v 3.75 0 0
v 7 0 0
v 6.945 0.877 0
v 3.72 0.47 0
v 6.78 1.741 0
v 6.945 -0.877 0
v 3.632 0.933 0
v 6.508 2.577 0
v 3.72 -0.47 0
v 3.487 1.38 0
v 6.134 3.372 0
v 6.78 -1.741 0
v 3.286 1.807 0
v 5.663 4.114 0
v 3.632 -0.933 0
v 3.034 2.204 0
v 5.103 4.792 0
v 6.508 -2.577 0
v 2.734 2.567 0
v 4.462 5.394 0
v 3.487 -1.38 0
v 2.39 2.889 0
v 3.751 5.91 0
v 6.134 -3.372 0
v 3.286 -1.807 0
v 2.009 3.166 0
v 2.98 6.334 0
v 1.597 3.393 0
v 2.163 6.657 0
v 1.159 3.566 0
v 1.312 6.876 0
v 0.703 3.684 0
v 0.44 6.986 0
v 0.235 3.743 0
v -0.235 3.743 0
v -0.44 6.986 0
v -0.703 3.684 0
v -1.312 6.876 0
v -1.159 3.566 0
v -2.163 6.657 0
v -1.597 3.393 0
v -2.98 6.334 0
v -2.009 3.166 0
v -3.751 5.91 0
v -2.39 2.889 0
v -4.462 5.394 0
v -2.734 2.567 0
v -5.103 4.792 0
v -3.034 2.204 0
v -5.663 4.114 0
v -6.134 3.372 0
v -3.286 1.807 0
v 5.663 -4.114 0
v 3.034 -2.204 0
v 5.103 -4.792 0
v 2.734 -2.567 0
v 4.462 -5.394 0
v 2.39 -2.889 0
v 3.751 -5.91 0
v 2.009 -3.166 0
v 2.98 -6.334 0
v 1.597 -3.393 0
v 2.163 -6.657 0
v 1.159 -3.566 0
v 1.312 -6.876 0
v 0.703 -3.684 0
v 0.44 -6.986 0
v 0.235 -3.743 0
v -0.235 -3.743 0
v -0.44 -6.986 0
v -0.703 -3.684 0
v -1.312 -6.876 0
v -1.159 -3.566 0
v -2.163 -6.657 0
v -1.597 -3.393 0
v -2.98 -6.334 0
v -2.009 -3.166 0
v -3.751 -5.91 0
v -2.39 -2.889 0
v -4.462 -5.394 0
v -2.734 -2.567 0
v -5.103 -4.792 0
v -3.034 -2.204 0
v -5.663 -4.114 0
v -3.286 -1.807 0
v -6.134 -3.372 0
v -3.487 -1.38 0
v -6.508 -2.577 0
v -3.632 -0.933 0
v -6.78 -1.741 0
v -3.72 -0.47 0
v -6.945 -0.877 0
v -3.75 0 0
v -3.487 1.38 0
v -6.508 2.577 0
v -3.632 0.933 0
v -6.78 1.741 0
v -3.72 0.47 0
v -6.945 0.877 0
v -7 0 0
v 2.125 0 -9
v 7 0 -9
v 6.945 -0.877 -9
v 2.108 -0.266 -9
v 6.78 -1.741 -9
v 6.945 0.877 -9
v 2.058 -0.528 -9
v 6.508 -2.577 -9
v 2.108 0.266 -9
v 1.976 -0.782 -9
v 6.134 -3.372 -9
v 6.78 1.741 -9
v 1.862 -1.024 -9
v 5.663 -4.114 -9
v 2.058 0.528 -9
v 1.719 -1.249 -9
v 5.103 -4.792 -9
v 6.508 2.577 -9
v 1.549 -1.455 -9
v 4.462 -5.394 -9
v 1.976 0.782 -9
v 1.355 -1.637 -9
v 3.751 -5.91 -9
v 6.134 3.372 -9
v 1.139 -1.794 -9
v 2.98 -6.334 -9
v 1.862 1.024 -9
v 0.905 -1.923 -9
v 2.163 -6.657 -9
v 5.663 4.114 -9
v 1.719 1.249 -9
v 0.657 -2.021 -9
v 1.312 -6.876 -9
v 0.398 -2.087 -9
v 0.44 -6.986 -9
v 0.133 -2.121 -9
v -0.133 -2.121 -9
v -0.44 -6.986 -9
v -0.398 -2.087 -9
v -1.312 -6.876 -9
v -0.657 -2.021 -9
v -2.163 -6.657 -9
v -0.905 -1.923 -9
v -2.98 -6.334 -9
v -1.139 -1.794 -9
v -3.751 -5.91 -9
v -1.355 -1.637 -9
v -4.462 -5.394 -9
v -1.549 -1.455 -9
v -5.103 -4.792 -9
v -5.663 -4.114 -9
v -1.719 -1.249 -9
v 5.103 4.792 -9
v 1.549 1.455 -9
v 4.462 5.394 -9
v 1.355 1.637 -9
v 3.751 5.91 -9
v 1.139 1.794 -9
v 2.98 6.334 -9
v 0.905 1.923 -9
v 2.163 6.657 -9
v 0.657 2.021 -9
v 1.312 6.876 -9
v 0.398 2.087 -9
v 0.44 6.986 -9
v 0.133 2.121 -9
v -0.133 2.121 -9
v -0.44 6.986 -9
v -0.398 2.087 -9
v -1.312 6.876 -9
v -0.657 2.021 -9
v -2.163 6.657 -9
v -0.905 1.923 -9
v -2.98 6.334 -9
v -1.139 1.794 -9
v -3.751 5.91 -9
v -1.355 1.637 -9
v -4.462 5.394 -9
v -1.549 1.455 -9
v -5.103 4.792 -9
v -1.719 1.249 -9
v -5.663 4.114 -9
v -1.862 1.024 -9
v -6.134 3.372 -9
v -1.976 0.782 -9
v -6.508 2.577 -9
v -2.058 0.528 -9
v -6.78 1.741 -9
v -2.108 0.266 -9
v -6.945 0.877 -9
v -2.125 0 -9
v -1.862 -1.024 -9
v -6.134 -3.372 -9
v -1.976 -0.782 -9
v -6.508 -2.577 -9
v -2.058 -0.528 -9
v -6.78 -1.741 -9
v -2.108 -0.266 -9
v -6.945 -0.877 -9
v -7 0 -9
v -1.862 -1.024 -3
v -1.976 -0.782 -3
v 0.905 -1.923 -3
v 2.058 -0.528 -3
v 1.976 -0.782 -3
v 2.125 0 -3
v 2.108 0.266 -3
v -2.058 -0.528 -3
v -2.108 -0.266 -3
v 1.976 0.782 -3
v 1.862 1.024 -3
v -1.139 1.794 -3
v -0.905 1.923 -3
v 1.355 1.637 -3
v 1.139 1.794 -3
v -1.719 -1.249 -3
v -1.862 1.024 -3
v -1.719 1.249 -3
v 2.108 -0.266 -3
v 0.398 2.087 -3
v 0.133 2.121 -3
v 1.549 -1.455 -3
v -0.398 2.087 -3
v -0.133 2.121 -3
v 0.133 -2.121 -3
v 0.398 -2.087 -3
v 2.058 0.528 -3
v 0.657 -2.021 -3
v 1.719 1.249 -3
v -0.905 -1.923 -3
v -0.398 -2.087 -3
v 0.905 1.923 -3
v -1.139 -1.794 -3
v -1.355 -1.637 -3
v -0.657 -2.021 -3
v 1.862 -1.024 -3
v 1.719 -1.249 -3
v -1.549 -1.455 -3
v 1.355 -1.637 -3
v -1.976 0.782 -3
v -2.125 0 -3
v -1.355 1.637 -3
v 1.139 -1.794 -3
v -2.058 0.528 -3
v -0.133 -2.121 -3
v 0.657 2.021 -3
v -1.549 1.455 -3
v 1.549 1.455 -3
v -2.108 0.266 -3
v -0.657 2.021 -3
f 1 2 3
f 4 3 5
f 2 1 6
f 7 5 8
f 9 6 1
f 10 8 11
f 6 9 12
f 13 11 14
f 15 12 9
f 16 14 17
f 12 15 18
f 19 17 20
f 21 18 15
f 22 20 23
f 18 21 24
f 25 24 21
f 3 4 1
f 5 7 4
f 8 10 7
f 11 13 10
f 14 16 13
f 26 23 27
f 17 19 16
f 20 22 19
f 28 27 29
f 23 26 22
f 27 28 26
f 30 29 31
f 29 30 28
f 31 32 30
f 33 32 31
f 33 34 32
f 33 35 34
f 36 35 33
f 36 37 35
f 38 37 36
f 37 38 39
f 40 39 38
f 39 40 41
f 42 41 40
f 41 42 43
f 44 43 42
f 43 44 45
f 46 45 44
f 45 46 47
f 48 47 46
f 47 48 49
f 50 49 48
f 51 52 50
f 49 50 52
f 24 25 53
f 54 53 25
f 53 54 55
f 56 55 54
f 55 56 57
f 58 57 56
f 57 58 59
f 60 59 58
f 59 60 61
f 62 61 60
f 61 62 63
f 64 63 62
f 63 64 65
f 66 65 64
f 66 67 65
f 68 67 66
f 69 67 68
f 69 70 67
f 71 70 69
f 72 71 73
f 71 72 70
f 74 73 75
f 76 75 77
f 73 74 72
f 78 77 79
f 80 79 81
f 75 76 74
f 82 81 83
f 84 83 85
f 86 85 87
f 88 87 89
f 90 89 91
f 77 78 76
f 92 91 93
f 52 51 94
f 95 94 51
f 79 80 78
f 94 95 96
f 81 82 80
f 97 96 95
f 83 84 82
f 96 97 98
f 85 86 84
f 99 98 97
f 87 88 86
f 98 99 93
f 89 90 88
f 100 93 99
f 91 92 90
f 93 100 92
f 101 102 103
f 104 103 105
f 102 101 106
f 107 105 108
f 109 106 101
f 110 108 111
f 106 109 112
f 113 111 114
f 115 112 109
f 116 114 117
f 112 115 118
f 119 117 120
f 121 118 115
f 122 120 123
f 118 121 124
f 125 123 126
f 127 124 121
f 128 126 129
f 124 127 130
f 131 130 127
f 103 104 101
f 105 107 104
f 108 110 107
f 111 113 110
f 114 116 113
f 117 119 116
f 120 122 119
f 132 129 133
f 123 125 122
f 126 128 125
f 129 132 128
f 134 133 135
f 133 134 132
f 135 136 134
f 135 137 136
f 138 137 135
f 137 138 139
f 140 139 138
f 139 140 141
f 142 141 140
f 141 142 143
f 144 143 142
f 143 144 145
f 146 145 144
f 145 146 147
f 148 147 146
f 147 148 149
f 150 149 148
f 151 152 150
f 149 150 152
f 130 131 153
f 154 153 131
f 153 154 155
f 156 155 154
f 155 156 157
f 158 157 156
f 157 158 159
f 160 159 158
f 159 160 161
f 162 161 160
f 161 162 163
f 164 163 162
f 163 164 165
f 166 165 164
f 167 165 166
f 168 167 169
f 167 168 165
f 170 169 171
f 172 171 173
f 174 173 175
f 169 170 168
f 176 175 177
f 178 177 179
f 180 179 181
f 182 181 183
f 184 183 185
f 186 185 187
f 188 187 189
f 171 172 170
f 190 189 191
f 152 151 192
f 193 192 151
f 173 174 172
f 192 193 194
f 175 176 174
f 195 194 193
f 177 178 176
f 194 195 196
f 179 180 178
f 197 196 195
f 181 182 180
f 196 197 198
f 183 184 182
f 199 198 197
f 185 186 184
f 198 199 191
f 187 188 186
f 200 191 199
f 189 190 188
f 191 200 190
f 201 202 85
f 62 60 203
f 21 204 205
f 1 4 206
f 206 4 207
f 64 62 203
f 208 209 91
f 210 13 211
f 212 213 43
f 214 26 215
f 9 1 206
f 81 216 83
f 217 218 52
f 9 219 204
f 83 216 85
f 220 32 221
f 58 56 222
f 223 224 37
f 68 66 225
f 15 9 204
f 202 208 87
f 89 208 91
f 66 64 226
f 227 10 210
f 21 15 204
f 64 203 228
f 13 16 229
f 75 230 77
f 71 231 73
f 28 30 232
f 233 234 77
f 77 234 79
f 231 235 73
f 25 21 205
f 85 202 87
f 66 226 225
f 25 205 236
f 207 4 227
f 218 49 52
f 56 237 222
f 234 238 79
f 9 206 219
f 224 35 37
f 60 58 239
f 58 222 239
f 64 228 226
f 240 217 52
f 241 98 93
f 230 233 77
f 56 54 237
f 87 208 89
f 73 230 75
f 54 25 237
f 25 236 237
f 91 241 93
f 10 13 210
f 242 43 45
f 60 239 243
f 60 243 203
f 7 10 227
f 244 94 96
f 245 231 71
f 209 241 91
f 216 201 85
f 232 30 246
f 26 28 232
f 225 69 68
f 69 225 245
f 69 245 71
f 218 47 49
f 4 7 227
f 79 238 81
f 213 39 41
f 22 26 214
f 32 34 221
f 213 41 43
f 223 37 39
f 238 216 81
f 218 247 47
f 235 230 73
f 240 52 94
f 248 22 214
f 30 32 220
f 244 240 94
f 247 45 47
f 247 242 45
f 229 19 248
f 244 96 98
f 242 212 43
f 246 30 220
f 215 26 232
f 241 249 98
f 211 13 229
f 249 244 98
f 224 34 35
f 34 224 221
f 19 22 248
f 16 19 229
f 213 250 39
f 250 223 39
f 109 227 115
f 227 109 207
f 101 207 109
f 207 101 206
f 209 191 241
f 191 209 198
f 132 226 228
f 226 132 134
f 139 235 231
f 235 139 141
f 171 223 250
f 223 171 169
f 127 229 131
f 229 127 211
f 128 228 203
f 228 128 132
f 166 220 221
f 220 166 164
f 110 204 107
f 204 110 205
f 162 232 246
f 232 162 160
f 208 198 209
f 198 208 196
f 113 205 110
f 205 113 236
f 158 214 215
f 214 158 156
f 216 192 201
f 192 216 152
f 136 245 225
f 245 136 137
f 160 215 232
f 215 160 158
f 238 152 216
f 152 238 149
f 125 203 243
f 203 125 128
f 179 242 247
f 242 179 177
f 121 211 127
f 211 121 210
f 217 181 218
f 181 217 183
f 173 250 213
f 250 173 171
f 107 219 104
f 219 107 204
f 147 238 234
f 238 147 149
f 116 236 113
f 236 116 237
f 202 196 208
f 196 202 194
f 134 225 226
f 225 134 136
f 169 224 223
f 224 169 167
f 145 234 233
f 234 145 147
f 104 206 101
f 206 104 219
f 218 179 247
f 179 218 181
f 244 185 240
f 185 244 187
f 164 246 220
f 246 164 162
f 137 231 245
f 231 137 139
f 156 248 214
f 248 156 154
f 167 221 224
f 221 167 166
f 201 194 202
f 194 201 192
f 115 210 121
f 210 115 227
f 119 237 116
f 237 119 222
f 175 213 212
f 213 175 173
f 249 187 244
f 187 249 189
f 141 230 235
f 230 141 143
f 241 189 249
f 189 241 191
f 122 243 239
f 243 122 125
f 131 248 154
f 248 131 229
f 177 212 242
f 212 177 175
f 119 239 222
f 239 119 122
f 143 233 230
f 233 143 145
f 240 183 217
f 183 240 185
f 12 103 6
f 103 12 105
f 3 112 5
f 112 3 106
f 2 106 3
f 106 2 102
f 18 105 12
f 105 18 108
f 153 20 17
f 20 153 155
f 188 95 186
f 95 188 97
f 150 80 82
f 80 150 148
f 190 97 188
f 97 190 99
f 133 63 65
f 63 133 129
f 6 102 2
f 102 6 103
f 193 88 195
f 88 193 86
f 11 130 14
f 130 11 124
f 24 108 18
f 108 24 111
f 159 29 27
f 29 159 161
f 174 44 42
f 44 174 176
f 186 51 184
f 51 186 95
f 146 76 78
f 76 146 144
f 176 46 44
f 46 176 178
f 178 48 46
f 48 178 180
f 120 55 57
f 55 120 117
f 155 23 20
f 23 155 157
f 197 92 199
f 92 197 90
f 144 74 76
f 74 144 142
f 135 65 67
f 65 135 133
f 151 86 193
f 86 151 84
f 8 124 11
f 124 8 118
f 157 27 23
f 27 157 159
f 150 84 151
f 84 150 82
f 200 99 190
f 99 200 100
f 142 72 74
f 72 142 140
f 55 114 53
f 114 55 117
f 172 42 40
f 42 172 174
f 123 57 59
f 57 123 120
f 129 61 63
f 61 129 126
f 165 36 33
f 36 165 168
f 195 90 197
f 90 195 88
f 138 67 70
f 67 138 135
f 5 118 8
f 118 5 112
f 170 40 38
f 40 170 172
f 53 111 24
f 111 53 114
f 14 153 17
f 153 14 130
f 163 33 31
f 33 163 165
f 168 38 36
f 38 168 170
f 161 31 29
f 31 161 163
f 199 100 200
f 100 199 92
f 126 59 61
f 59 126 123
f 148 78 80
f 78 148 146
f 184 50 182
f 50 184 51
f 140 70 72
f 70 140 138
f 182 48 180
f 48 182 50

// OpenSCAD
$fn = 50;


difference() {
	union() {
		translate(v = [0, 0, -9.0000000000]) {
			cylinder(h = 9, r = 7.0000000000);
		}
		cylinder(h = 0, r = 13.0000000000);
	}
	union() {
		translate(v = [0, 0, 0]) {
			rotate(a = [0, 0, 0]) {
				difference() {
					union() {
						#translate(v = [0, 0, -9.0000000000]) {
							cylinder(h = 9, r = 2.0000000000);
						}
						#translate(v = [0, 0, -3]) {
							cylinder(h = 3, r = 7.0000000000, r1 = 2.1250000000, r2 = 3.7500000000);
						}
						#translate(v = [0, 0, -9.0000000000]) {
							cylinder(h = 9, r = 2.1250000000);
						}
						#translate(v = [0, 0, -9.0000000000]) {
							cylinder(h = 9, r = 2.0000000000);
						}
					}
					union();
				}
			}
		}
	}
}
